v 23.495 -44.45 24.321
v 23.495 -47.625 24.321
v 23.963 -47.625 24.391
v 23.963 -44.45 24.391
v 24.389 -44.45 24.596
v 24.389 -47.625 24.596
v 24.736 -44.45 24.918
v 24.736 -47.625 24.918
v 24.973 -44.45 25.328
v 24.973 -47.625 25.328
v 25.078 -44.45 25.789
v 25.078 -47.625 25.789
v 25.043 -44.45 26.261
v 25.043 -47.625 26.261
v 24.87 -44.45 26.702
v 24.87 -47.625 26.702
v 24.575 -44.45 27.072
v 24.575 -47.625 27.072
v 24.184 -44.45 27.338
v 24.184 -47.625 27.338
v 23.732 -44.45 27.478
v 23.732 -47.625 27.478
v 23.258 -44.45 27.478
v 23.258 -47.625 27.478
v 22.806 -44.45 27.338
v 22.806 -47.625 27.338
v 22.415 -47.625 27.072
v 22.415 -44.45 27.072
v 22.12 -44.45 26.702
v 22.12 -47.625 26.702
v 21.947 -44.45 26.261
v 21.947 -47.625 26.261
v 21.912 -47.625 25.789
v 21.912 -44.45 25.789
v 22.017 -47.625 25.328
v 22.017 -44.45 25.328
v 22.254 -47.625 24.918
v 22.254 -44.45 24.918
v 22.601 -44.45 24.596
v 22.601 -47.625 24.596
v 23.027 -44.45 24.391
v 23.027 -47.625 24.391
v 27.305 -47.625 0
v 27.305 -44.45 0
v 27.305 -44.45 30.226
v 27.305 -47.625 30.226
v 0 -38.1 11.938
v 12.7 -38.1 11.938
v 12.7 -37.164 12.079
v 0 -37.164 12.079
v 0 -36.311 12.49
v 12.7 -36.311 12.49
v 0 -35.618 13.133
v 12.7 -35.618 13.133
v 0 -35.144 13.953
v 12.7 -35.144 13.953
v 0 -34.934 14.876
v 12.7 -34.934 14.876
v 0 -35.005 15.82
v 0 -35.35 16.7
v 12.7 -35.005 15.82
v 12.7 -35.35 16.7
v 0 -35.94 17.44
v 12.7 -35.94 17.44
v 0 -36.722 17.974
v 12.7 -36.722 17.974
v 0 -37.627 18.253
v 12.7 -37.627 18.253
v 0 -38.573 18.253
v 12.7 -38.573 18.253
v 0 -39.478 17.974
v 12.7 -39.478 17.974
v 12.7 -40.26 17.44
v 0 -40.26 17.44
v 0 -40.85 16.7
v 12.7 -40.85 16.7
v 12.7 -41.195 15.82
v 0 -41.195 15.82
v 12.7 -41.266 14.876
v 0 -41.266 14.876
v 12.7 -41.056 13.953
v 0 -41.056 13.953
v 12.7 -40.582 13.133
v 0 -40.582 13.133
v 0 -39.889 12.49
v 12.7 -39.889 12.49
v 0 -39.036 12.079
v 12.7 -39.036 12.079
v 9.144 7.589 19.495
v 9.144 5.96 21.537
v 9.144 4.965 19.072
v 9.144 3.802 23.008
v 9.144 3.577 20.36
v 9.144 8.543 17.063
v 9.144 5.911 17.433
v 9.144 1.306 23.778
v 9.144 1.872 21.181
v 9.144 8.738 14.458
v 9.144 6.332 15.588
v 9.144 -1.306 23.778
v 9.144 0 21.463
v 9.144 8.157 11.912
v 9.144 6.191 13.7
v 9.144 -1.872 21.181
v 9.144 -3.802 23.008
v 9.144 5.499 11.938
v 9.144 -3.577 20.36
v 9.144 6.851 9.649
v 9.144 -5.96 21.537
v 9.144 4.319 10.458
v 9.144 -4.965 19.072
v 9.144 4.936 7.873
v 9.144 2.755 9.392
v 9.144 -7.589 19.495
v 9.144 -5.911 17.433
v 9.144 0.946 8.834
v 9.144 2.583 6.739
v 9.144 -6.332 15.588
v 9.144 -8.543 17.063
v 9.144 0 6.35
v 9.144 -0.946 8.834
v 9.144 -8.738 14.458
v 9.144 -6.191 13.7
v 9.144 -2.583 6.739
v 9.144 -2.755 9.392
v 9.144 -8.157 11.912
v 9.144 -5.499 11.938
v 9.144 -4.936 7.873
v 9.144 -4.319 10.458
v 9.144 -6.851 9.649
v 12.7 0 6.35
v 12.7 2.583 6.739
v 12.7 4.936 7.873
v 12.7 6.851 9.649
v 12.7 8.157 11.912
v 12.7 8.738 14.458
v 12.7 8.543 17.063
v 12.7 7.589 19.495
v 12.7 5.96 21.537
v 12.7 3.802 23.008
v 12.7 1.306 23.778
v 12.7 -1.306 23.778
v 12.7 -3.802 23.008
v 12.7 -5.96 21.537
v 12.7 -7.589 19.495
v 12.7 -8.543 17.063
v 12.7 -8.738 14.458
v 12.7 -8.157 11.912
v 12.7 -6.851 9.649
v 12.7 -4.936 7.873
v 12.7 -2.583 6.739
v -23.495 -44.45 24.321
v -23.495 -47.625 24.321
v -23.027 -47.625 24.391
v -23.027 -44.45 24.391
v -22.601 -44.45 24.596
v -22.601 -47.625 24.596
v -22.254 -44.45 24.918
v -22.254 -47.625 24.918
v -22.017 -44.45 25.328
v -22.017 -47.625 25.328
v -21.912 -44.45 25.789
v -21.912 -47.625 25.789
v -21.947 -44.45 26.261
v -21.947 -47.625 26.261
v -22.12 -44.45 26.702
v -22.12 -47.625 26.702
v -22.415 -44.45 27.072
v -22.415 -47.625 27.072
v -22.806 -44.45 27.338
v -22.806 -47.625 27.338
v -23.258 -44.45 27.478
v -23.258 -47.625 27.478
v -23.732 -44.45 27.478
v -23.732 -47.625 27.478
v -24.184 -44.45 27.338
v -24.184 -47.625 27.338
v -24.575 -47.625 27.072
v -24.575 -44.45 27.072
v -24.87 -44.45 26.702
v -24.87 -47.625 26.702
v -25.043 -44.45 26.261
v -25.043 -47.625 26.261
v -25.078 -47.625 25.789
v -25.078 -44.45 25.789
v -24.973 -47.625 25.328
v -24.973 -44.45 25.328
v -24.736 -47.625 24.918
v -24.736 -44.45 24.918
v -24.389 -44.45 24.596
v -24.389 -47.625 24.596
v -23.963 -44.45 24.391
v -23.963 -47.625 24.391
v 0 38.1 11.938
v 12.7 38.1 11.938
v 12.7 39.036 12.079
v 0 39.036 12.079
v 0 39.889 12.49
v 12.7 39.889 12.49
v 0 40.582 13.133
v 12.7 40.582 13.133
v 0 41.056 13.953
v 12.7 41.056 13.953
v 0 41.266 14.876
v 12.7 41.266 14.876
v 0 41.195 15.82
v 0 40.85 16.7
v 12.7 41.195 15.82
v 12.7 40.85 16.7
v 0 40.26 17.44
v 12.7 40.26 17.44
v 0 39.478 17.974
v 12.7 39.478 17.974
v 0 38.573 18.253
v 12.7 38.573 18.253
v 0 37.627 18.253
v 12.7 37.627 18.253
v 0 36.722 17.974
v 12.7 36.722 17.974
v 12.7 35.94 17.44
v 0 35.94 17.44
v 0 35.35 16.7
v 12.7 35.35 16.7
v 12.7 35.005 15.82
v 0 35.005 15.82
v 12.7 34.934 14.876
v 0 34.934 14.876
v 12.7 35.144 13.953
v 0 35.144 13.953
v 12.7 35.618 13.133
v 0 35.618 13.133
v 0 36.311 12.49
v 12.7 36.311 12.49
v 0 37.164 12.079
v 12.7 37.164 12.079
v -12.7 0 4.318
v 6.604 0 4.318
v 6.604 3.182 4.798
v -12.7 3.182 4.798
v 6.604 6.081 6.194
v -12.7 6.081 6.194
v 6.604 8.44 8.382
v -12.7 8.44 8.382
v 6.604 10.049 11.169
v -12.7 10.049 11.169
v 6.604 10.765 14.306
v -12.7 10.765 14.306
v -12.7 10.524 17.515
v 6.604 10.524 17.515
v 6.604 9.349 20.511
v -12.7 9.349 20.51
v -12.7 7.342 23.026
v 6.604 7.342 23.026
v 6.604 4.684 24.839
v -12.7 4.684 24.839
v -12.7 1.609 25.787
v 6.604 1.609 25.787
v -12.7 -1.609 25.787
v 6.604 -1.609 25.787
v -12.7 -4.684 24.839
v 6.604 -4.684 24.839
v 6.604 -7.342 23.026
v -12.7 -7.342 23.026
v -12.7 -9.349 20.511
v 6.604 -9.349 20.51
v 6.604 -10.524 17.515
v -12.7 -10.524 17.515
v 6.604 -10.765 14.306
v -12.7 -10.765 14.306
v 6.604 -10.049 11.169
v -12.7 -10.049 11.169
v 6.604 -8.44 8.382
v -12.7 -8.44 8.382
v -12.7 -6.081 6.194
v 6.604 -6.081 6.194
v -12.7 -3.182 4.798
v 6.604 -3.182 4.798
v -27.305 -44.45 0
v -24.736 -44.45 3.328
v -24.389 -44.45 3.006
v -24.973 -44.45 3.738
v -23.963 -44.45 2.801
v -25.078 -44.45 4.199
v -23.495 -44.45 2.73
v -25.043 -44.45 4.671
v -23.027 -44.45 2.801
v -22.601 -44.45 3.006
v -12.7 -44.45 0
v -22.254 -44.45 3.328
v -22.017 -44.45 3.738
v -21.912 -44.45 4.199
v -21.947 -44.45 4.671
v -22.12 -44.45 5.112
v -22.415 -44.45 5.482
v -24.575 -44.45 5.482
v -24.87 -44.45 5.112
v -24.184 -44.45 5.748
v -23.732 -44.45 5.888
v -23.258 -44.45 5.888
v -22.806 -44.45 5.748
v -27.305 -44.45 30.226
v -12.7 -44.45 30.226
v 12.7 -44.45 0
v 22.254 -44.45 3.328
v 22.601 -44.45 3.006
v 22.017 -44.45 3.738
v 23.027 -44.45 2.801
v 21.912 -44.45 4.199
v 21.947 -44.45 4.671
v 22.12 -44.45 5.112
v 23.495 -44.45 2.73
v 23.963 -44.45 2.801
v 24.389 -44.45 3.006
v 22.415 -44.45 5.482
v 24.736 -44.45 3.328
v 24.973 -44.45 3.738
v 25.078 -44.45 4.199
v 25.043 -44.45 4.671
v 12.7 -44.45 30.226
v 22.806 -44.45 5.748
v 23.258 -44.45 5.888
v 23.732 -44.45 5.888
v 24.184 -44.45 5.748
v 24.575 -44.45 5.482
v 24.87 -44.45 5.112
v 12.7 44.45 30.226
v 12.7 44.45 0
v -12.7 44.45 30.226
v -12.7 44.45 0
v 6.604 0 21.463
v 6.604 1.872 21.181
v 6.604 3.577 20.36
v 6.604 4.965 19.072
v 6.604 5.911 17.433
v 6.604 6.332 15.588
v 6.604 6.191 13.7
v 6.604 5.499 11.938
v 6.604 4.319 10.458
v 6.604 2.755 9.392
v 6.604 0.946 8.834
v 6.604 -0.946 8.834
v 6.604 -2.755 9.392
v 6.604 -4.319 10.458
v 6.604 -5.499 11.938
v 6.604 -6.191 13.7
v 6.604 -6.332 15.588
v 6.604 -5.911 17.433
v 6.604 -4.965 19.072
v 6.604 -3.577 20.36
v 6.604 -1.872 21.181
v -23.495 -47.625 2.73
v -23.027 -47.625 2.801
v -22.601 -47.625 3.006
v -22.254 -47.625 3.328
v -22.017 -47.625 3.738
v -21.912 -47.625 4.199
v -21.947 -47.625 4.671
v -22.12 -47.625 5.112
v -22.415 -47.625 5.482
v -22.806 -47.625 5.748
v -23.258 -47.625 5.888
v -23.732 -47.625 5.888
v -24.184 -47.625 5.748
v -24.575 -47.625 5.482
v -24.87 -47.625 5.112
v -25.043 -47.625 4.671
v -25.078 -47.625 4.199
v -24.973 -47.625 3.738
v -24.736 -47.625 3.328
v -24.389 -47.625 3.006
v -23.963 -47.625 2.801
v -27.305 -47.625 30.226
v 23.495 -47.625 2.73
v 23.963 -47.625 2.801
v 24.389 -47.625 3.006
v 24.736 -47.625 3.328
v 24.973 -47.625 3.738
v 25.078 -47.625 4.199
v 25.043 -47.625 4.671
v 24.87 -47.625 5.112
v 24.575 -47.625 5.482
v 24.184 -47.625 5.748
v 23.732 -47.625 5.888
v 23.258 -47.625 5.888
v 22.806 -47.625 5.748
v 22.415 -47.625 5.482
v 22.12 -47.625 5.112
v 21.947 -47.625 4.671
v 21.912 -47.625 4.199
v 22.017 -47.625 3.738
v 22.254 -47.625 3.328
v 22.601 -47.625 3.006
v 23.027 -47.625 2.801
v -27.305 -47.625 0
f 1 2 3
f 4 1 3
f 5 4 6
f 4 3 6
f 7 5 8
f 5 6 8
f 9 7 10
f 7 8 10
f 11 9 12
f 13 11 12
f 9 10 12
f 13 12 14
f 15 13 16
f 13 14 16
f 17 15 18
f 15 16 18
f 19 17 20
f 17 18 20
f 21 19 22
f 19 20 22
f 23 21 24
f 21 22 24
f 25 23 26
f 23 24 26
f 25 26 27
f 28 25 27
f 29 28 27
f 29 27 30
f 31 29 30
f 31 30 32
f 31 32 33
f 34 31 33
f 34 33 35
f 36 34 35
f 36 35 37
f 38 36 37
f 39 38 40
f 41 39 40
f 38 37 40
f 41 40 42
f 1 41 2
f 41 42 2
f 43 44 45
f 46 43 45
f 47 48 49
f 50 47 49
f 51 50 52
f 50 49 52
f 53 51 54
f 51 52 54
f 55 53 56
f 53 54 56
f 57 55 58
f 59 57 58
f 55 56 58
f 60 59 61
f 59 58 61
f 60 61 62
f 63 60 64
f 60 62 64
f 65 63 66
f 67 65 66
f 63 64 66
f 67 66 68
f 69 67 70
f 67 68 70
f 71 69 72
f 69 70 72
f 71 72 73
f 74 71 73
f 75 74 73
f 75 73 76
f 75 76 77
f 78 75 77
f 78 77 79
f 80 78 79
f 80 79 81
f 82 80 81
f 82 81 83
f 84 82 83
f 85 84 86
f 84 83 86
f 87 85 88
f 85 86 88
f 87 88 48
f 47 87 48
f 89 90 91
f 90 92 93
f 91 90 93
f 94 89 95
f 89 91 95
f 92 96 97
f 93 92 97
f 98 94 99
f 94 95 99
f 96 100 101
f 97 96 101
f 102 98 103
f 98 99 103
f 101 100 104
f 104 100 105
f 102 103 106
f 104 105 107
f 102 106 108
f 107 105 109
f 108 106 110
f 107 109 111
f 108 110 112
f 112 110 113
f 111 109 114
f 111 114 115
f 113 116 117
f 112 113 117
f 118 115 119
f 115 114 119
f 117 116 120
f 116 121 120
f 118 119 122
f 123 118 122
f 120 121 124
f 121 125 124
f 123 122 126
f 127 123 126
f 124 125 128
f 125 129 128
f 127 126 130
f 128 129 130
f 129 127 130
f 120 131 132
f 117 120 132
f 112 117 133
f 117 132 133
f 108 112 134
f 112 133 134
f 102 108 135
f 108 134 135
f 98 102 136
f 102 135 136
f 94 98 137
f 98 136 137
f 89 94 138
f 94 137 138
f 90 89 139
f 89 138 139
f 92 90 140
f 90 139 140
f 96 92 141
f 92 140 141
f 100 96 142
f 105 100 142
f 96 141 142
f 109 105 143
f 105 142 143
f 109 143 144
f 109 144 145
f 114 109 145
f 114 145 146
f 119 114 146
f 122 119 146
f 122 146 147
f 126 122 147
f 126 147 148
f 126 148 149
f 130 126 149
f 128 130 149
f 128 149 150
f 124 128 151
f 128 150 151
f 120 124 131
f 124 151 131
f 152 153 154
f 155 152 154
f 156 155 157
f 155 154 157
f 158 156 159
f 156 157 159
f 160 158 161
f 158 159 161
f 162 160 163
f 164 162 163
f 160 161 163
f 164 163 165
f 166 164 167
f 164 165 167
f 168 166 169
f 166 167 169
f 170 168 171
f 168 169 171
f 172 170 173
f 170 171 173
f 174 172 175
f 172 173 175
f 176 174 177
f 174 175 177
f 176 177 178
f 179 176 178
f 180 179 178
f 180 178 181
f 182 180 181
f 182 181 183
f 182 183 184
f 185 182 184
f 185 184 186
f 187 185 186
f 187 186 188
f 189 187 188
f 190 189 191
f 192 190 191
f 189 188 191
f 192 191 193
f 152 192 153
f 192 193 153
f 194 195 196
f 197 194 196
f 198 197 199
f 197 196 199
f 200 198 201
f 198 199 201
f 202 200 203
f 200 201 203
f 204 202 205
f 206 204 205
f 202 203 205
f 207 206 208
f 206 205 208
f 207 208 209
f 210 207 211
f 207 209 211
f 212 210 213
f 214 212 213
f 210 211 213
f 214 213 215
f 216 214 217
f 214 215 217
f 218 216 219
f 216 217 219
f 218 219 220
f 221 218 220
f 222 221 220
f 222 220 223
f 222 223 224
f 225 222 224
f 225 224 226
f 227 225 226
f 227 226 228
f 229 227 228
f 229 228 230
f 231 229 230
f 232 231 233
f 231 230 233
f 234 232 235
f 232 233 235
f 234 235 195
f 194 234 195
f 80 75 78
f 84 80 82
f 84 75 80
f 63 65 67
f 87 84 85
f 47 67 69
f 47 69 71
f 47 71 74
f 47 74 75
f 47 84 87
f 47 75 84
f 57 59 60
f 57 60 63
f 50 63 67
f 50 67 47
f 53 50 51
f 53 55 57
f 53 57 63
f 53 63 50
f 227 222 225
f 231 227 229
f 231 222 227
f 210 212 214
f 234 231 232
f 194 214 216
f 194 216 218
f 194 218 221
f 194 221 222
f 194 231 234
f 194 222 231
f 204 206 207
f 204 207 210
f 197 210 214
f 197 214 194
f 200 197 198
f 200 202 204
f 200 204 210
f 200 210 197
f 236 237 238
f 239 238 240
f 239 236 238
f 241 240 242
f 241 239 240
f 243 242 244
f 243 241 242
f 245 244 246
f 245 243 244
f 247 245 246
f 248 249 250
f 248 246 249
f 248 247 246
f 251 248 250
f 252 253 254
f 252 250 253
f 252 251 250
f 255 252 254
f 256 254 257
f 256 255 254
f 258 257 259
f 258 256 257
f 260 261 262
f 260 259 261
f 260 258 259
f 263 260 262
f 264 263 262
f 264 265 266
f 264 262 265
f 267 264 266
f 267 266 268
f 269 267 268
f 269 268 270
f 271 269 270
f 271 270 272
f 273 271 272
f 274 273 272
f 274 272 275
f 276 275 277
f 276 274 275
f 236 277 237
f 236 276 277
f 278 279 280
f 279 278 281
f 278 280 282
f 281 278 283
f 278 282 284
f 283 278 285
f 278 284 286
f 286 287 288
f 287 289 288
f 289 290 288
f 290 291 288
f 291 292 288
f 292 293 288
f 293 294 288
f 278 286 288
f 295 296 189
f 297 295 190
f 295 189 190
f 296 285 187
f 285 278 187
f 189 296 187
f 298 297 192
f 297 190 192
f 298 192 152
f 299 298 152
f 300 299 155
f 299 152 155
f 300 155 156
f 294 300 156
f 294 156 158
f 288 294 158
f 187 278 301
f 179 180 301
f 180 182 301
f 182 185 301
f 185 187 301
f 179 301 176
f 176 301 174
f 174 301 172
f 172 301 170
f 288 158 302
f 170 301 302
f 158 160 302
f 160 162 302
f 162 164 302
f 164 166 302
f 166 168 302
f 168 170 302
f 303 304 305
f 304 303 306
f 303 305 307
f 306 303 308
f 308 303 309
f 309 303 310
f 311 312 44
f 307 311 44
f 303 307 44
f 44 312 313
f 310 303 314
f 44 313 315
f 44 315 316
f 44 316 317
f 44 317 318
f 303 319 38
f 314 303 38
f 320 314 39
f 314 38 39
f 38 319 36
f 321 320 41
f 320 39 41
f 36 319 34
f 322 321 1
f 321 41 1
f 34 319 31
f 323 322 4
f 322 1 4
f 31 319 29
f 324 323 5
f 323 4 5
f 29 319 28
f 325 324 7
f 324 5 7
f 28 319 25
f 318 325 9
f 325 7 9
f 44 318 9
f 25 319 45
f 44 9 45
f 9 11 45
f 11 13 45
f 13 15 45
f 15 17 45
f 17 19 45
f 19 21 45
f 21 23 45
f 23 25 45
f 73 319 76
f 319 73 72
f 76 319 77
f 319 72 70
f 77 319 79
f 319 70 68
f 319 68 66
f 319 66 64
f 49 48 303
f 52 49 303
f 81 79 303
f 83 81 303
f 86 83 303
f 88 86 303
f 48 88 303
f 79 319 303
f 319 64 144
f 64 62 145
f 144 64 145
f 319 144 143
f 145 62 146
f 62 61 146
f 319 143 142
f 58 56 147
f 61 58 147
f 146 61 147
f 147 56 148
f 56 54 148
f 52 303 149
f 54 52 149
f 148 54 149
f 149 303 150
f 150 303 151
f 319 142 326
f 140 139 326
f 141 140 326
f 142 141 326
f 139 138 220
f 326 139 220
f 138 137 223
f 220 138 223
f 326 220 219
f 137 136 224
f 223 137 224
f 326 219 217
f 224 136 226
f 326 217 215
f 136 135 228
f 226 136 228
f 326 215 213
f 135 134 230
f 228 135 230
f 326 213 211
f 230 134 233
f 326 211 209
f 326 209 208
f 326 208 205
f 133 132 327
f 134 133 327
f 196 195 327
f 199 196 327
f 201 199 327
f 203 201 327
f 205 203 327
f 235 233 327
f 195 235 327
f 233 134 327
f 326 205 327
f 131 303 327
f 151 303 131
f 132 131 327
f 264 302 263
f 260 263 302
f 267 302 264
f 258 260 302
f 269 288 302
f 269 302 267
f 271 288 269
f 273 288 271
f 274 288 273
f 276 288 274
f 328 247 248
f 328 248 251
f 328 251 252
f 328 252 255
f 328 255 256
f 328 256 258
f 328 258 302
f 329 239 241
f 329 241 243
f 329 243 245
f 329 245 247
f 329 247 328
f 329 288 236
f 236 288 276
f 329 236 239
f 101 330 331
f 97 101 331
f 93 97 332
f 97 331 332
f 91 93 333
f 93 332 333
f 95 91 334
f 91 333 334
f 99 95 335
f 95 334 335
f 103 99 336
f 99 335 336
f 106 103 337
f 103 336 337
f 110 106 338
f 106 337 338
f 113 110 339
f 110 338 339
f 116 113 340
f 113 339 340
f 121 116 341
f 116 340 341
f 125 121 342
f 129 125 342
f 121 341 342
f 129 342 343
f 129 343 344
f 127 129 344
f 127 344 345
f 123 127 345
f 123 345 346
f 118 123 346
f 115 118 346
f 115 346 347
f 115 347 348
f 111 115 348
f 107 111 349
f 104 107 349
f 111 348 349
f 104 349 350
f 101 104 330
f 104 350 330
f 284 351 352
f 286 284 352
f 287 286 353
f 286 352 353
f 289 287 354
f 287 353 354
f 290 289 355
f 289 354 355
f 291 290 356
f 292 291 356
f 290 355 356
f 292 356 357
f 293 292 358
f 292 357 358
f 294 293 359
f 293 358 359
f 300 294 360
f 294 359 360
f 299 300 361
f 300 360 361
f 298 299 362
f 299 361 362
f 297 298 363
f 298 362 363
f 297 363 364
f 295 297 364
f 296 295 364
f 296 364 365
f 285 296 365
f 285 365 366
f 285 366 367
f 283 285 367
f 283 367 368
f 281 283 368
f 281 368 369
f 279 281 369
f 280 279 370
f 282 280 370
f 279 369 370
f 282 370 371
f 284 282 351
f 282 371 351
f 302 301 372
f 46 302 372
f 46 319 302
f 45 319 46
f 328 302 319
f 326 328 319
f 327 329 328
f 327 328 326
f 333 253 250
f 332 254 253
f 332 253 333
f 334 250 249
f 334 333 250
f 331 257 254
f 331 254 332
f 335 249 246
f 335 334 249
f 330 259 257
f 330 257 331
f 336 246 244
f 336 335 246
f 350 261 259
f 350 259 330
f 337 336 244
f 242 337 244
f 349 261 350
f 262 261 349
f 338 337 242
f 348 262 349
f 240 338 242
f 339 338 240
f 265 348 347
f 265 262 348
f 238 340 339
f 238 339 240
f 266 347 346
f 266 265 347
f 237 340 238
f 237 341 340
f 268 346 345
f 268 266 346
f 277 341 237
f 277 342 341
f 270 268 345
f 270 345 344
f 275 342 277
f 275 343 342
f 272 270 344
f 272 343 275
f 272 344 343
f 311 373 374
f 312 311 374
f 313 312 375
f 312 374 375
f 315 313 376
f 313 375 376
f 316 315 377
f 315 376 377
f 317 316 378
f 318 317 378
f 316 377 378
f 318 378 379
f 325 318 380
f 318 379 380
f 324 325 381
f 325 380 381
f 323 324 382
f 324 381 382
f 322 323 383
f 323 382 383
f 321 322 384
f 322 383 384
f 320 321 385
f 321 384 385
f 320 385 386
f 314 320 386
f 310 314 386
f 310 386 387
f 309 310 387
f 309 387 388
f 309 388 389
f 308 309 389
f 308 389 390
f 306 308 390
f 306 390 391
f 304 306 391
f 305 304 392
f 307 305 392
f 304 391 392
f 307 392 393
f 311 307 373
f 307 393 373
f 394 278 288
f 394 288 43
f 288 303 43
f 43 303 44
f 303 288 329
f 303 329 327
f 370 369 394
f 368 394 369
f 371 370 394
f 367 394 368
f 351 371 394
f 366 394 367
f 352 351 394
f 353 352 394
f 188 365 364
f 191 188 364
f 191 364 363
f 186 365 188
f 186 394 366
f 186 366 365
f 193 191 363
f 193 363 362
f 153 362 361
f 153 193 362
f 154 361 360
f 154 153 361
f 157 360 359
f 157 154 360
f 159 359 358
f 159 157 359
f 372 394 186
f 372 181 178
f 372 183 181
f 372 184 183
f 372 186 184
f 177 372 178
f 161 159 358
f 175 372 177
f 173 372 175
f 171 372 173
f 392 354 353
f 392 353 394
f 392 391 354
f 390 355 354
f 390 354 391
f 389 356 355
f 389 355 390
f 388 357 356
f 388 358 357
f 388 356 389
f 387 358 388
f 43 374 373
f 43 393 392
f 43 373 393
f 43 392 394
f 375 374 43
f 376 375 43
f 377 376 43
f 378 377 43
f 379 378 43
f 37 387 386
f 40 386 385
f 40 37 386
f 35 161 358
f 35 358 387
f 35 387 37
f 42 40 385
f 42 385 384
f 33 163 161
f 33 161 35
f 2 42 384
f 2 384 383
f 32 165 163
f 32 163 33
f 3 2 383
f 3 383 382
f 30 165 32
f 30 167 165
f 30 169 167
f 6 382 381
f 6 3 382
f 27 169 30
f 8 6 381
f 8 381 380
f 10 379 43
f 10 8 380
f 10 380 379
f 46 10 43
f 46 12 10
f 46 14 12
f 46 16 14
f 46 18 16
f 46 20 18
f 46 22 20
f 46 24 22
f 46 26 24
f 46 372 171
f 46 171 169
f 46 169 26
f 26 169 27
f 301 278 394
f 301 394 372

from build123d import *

# Parameters (mm, degrees)
SKETCH1_W           = 25.4
SKETCH1_H           = 88.9
BOSS_EXTRUDE1_DEPTH = 30.226
SKETCH2_R           = 3.175
CUT_EXTRUDE1_DEPTH  = 12.7
SKETCH3_R           = 8.763
CUT_EXTRUDE2_DEPTH  = 3.556
CUT_EXTRUDE3_START  = -21.844
SKETCH4_R           = 10.795
CUT_EXTRUDE3_DEPTH  = 21.844
SKETCH5_W           = 54.61
SKETCH5_H           = 30.226
BOSS_EXTRUDE2_DEPTH = 3.175
SKETCH6_R           = 1.5875
CUT_EXTRUDE4_DEPTH  = 3.175
BOSS_EXTRUDE3_START = 2.54
SKETCH8_R           = 10.795
SKETCH8_R_2         = 6.35
BOSS_EXTRUDE3_DEPTH = 2.54


with BuildPart() as part:
    # Sketch1 → Boss-Extrude1 (new body)
    with BuildSketch(Plane.XY):
        Rectangle(SKETCH1_W, SKETCH1_H)
    extrude(amount=BOSS_EXTRUDE1_DEPTH)

    # Sketch2 → Cut-Extrude1 (cut)
    with BuildSketch(Plane(origin=(12.7, 0, 0), x_dir=(0, 0, -1), z_dir=(1, 0, 0))):
        with Locations((-15.113, 38.1)):
            Circle(SKETCH2_R)
        with Locations((-15.113, -38.1)):
            Circle(SKETCH2_R)
    extrude(amount=-CUT_EXTRUDE1_DEPTH, mode=Mode.SUBTRACT)

    # Sketch3 → Cut-Extrude2 (cut)
    with BuildSketch(Plane(origin=(12.7, 0, 0), x_dir=(0, 0, -1), z_dir=(1, 0, 0))):
        with Locations((-15.113, 0)):
            Circle(SKETCH3_R)
    extrude(amount=-CUT_EXTRUDE2_DEPTH, mode=Mode.SUBTRACT)

    # Sketch4 → Cut-Extrude3 (cut)
    with BuildSketch(Plane(origin=(9.144, 0, 0), x_dir=(0, 0, -1), z_dir=(1, 0, 0)).offset(CUT_EXTRUDE3_START)):
        with Locations((-15.113, 0)):
            Circle(SKETCH4_R)
    extrude(amount=CUT_EXTRUDE3_DEPTH, mode=Mode.SUBTRACT)

    # Sketch5 → Boss-Extrude2 (add)
    with BuildSketch(Plane.XZ.offset(44.45)):
        with Locations((0, 15.113)):
            Rectangle(SKETCH5_W, SKETCH5_H)
    extrude(amount=BOSS_EXTRUDE2_DEPTH)

    # Sketch6 → Cut-Extrude4 (cut)
    with BuildSketch(Plane.XZ.offset(47.625)):
        with Locations(Location((-23.495, 25.908, 0), (0, 0, 270))):
            Circle(SKETCH6_R)
        with Locations(Location((-23.495, 4.318, 0), (0, 0, 270))):
            Circle(SKETCH6_R)
        with Locations(Location((23.495, 4.318, 0), (0, 0, 270))):
            Circle(SKETCH6_R)
        with Locations(Location((23.495, 25.908, 0), (0, 0, 270))):
            Circle(SKETCH6_R)
    extrude(amount=-CUT_EXTRUDE4_DEPTH, mode=Mode.SUBTRACT)

    # Sketch8 → Boss-Extrude3 (add)
    with BuildSketch(Plane.ZY.offset(-9.144).offset(BOSS_EXTRUDE3_START)):
        with Locations(Location((15.113, 0, 0), (0, 0, 180))):
            Circle(SKETCH8_R)
        with Locations((15.113, 0)):
            Circle(SKETCH8_R_2, mode=Mode.SUBTRACT)
    extrude(amount=-BOSS_EXTRUDE3_DEPTH)


solid = part.part
